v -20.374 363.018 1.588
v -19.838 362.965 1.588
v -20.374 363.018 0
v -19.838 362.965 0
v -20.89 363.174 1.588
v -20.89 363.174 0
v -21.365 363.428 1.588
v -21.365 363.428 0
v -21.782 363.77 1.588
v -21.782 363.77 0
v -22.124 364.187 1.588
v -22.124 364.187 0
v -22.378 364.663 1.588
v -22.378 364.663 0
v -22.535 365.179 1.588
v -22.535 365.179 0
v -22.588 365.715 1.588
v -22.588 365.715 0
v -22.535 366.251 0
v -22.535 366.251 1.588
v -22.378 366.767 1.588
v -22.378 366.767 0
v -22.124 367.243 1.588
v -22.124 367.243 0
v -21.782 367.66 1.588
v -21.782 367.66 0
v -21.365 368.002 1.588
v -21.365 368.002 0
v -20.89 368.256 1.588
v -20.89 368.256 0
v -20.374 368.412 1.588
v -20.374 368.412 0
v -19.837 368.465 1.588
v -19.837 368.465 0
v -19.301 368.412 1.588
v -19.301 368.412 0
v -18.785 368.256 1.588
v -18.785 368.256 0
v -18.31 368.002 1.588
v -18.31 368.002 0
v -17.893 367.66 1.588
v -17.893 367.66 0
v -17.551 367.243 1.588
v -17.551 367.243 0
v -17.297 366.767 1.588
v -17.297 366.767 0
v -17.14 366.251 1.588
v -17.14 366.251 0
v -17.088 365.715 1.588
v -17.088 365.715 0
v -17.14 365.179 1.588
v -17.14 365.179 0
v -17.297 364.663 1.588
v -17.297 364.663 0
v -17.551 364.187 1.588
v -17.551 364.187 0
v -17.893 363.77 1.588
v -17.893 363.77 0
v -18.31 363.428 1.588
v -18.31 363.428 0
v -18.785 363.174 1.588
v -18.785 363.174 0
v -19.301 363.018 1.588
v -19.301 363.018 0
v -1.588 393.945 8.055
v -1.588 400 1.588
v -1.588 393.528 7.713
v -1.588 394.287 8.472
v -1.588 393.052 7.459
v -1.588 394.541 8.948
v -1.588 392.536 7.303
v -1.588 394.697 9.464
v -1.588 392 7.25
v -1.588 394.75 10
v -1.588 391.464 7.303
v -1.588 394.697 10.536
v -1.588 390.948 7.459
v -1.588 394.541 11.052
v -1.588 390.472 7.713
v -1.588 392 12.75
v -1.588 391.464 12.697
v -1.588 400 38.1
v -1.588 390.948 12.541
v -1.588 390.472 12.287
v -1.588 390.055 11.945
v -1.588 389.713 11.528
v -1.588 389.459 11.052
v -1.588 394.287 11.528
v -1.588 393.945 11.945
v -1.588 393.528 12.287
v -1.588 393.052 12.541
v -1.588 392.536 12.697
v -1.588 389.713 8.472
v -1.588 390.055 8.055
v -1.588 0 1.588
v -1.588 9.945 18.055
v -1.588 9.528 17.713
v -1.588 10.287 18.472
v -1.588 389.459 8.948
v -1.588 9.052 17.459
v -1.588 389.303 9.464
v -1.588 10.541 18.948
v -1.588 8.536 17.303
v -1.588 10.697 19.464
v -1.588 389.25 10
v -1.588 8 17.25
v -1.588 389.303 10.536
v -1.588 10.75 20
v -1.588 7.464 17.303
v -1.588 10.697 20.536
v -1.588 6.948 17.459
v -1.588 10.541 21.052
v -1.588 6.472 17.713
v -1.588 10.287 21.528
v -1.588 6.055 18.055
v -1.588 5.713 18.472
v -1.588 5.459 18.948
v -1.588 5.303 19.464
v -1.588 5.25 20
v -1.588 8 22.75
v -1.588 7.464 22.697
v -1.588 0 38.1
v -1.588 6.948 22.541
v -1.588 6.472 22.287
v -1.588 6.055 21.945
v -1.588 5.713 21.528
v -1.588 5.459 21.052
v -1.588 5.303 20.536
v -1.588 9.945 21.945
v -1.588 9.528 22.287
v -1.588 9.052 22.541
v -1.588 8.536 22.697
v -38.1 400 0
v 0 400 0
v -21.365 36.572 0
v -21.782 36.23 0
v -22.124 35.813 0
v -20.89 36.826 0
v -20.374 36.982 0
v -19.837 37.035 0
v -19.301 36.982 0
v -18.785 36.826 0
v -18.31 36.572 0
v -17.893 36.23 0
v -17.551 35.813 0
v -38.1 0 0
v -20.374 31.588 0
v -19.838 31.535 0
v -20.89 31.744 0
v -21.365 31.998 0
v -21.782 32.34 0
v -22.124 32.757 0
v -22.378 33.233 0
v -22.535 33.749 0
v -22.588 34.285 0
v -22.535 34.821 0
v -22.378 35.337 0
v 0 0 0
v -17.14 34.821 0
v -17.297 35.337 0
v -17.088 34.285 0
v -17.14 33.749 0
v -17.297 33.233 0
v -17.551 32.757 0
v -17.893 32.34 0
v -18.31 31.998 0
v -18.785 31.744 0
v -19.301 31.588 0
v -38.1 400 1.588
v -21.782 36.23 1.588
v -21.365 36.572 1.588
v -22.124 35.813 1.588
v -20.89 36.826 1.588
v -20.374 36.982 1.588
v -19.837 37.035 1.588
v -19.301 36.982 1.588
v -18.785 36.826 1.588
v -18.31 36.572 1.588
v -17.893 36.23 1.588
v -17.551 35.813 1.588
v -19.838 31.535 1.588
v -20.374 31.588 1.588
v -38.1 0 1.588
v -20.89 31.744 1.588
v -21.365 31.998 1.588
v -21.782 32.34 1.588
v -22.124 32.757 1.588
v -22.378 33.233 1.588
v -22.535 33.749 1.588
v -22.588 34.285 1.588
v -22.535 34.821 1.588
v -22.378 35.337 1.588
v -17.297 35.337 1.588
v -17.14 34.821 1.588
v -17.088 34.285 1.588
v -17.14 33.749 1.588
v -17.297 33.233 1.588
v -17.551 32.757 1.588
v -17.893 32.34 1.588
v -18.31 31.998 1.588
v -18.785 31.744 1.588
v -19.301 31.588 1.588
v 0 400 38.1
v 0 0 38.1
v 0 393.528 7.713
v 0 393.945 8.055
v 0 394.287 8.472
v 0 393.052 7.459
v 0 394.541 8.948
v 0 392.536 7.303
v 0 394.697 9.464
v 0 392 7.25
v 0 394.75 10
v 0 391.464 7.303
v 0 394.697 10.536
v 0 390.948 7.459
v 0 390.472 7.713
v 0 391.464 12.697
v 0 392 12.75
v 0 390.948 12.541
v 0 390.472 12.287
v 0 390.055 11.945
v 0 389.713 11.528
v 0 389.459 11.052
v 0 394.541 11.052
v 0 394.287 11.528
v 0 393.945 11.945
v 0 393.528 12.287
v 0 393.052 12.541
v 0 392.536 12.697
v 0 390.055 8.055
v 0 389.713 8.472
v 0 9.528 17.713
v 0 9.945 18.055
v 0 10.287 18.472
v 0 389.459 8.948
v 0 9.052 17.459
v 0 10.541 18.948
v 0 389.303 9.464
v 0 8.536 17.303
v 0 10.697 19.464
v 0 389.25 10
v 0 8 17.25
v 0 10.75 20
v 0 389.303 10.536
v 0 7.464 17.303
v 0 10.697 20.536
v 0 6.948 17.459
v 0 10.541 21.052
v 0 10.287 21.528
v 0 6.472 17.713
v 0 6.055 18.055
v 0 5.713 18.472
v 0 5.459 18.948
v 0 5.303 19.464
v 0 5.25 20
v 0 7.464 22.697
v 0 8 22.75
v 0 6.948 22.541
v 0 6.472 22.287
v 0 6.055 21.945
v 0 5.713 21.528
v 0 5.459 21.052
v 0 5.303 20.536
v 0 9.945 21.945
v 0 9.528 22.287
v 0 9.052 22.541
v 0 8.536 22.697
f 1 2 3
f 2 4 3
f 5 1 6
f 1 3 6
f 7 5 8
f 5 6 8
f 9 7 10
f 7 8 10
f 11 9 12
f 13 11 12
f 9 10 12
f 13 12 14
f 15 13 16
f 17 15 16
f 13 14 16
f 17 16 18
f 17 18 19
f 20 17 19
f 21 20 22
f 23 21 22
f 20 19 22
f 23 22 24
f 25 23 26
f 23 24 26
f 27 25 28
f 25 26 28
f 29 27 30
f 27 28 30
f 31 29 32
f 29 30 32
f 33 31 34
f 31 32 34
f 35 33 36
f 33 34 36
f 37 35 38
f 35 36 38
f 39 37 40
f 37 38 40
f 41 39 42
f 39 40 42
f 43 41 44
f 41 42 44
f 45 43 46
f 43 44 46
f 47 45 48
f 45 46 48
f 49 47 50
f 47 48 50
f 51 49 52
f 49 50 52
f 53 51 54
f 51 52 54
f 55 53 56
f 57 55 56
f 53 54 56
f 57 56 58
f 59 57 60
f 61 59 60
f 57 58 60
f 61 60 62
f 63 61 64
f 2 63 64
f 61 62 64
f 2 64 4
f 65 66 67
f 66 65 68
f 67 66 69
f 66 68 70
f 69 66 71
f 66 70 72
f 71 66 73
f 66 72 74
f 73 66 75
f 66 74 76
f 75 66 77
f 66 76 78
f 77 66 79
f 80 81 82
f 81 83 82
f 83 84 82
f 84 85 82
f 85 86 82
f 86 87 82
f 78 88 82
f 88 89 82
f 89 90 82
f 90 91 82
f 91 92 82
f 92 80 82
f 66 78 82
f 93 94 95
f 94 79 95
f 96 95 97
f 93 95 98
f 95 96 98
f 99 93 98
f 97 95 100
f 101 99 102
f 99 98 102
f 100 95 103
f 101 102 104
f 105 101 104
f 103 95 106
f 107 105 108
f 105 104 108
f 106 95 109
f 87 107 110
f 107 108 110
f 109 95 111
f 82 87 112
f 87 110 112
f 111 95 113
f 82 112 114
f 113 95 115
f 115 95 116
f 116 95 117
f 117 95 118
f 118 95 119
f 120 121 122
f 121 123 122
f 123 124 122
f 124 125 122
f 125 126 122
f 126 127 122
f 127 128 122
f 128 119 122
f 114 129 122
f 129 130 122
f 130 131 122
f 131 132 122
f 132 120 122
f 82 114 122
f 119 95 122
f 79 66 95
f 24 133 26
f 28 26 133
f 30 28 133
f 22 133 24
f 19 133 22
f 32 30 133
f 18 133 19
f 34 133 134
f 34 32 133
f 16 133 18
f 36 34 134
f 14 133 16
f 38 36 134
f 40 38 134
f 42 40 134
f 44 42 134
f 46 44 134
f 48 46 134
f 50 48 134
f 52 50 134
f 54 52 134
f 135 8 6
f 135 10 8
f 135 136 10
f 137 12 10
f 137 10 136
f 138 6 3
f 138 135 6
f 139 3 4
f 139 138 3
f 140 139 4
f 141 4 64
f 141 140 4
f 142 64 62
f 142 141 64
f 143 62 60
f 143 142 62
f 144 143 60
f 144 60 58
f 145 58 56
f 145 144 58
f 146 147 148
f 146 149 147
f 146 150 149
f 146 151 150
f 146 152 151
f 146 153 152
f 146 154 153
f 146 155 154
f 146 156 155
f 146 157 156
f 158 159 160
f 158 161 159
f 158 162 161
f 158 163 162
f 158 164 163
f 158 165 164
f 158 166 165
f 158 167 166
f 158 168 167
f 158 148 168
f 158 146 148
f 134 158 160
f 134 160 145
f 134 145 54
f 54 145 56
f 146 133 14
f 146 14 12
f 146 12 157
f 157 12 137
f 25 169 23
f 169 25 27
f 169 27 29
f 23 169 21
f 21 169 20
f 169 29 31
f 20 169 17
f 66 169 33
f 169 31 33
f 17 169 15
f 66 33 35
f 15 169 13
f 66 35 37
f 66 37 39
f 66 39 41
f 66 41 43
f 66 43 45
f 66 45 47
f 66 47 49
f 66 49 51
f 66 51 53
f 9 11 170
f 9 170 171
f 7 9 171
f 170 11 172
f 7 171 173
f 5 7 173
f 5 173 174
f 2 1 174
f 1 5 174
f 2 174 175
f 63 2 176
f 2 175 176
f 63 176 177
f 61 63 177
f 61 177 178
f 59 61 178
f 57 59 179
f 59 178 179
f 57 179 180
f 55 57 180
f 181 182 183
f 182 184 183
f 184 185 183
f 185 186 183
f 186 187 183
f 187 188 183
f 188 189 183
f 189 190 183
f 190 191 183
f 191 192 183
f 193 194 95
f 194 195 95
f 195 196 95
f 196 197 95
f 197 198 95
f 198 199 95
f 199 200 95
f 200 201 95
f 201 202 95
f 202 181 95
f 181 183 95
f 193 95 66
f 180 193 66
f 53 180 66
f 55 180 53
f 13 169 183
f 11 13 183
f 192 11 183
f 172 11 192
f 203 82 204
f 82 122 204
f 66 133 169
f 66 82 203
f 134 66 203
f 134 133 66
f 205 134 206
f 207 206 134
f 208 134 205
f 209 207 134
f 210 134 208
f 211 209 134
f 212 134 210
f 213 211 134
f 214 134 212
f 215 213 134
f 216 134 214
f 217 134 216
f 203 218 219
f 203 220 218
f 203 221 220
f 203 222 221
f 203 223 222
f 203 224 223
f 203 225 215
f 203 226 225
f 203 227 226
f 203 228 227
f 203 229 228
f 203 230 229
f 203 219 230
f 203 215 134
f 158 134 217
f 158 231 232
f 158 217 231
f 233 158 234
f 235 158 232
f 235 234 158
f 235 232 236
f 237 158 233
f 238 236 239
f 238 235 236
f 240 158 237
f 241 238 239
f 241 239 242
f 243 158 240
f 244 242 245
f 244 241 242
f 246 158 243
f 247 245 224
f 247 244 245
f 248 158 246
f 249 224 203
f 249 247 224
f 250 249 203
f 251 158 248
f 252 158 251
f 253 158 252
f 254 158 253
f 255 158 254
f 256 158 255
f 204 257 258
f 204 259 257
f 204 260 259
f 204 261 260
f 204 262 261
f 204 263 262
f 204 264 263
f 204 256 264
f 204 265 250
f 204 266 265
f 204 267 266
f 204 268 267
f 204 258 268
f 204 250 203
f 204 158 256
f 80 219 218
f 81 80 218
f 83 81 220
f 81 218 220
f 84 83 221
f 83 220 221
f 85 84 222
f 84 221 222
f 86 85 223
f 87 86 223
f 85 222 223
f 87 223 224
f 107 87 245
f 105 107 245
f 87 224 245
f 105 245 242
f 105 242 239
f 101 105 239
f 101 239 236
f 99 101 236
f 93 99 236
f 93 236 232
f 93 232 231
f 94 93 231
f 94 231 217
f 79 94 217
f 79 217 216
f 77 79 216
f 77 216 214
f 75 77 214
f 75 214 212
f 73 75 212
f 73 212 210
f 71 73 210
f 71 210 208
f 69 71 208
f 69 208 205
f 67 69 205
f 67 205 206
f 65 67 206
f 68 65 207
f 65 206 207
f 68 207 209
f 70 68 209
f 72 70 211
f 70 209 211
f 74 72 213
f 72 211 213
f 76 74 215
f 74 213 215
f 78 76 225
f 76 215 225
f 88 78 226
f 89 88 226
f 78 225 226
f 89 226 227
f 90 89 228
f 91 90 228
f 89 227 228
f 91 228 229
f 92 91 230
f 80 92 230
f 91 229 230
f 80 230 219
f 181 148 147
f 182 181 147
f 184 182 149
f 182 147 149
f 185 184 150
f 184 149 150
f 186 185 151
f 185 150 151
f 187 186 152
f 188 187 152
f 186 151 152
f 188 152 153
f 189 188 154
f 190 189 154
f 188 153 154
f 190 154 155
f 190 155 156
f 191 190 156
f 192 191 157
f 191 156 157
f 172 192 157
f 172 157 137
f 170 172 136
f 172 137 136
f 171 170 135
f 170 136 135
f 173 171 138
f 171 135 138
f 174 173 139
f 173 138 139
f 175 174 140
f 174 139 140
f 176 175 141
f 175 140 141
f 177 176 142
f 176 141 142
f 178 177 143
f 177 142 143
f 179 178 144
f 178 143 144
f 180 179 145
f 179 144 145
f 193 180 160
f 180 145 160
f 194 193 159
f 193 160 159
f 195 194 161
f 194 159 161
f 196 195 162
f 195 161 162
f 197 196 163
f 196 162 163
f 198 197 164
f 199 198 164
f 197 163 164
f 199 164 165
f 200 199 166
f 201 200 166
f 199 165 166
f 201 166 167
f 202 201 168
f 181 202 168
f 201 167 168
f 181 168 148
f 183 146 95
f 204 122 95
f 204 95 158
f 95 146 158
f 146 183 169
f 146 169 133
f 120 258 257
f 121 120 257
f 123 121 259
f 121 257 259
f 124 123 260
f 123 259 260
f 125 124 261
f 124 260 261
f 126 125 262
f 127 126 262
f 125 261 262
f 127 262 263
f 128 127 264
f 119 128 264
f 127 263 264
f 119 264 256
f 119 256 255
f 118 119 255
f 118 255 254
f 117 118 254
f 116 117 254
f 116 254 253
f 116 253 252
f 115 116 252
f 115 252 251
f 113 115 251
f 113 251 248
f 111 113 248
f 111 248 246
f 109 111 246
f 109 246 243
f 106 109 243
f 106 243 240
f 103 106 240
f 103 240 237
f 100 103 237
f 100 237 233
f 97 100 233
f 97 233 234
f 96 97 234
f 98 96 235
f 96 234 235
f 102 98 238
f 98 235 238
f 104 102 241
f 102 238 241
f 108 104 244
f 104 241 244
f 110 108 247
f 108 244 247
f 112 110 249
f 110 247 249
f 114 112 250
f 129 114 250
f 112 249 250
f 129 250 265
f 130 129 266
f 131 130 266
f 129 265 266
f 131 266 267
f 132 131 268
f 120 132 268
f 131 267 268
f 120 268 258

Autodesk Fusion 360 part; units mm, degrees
sketch "Sketch1" plane through (0, 0, 0) normal (0, 1, 0) x (1, 0, 0)
  line L0 (-38.1, 0) -> (0, 0)
  line L1 (0, 0) -> (0, -38.1)
  line L2 (-38.1, -1.5875) -> (-1.5875, -1.5875)
  line L3 (-1.5875, -1.5875) -> (-1.5875, -38.1)
  line L4 (-1.5875, -38.1) -> (0, -38.1)
  line L5 (-38.1, -1.5875) -> (-38.1, 0)
  dimension "d5" = 38.1
  dimension "d6" = 1.5875
extrude "Extrude1" add sketch "Sketch1" along normal blind 400
sketch "Sketch3" plane through (-1.5875, 0, 0) normal (-1, 0, 0) x (0, -1, 0)
  line L0 (0, 1.5875) -> (0, 38.1)
  line L1 (0, 38.1) -> (-400, 38.1)
  line L2 (-400, 38.1) -> (-400, 1.5875)
  line L3 (-400, 1.5875) -> (0, 1.5875)
  circle A0 centre (-392, 10) radius 4.9317
  circle A1 centre (-8, 20) radius 5
  line L4 (0, 0) -> (-400, 0)
  dimension "d15" = 10
  dimension "d16" = 8
  dimension "d17" = 8
  dimension "d18" = 20
hole "Hole2" at (-1.5875, 8, 20) at (-1.5875, 392, 10) direction (1, 0, 0) diameter 5.5 depth 7 tip angle 118
sketch "Sketch4" plane through (0, 0, 1.5875) normal (0, 0, 1) x (-1, 0, 0)
  line L0 (38.1, 0) -> (1.5875, 0)
  line L1 (1.5875, 0) -> (1.5875, -400)
  line L2 (1.5875, -400) -> (38.1, -400)
  line L3 (38.1, -400) -> (38.1, 0)
  circle A0 centre (19.8375, -34.285) radius 6.9462
  circle A1 centre (19.8375, -365.715) radius 6.9462
  dimension "d22" = 34.285
  dimension "d23" = 34.285
  dimension "d24" = 18.25
hole "Hole3" at (-19.8375, 34.285, 1.5875) at (-19.8375, 365.715, 1.5875) direction (0, 0, -1) diameter 5.5 depth 7 tip angle 118
